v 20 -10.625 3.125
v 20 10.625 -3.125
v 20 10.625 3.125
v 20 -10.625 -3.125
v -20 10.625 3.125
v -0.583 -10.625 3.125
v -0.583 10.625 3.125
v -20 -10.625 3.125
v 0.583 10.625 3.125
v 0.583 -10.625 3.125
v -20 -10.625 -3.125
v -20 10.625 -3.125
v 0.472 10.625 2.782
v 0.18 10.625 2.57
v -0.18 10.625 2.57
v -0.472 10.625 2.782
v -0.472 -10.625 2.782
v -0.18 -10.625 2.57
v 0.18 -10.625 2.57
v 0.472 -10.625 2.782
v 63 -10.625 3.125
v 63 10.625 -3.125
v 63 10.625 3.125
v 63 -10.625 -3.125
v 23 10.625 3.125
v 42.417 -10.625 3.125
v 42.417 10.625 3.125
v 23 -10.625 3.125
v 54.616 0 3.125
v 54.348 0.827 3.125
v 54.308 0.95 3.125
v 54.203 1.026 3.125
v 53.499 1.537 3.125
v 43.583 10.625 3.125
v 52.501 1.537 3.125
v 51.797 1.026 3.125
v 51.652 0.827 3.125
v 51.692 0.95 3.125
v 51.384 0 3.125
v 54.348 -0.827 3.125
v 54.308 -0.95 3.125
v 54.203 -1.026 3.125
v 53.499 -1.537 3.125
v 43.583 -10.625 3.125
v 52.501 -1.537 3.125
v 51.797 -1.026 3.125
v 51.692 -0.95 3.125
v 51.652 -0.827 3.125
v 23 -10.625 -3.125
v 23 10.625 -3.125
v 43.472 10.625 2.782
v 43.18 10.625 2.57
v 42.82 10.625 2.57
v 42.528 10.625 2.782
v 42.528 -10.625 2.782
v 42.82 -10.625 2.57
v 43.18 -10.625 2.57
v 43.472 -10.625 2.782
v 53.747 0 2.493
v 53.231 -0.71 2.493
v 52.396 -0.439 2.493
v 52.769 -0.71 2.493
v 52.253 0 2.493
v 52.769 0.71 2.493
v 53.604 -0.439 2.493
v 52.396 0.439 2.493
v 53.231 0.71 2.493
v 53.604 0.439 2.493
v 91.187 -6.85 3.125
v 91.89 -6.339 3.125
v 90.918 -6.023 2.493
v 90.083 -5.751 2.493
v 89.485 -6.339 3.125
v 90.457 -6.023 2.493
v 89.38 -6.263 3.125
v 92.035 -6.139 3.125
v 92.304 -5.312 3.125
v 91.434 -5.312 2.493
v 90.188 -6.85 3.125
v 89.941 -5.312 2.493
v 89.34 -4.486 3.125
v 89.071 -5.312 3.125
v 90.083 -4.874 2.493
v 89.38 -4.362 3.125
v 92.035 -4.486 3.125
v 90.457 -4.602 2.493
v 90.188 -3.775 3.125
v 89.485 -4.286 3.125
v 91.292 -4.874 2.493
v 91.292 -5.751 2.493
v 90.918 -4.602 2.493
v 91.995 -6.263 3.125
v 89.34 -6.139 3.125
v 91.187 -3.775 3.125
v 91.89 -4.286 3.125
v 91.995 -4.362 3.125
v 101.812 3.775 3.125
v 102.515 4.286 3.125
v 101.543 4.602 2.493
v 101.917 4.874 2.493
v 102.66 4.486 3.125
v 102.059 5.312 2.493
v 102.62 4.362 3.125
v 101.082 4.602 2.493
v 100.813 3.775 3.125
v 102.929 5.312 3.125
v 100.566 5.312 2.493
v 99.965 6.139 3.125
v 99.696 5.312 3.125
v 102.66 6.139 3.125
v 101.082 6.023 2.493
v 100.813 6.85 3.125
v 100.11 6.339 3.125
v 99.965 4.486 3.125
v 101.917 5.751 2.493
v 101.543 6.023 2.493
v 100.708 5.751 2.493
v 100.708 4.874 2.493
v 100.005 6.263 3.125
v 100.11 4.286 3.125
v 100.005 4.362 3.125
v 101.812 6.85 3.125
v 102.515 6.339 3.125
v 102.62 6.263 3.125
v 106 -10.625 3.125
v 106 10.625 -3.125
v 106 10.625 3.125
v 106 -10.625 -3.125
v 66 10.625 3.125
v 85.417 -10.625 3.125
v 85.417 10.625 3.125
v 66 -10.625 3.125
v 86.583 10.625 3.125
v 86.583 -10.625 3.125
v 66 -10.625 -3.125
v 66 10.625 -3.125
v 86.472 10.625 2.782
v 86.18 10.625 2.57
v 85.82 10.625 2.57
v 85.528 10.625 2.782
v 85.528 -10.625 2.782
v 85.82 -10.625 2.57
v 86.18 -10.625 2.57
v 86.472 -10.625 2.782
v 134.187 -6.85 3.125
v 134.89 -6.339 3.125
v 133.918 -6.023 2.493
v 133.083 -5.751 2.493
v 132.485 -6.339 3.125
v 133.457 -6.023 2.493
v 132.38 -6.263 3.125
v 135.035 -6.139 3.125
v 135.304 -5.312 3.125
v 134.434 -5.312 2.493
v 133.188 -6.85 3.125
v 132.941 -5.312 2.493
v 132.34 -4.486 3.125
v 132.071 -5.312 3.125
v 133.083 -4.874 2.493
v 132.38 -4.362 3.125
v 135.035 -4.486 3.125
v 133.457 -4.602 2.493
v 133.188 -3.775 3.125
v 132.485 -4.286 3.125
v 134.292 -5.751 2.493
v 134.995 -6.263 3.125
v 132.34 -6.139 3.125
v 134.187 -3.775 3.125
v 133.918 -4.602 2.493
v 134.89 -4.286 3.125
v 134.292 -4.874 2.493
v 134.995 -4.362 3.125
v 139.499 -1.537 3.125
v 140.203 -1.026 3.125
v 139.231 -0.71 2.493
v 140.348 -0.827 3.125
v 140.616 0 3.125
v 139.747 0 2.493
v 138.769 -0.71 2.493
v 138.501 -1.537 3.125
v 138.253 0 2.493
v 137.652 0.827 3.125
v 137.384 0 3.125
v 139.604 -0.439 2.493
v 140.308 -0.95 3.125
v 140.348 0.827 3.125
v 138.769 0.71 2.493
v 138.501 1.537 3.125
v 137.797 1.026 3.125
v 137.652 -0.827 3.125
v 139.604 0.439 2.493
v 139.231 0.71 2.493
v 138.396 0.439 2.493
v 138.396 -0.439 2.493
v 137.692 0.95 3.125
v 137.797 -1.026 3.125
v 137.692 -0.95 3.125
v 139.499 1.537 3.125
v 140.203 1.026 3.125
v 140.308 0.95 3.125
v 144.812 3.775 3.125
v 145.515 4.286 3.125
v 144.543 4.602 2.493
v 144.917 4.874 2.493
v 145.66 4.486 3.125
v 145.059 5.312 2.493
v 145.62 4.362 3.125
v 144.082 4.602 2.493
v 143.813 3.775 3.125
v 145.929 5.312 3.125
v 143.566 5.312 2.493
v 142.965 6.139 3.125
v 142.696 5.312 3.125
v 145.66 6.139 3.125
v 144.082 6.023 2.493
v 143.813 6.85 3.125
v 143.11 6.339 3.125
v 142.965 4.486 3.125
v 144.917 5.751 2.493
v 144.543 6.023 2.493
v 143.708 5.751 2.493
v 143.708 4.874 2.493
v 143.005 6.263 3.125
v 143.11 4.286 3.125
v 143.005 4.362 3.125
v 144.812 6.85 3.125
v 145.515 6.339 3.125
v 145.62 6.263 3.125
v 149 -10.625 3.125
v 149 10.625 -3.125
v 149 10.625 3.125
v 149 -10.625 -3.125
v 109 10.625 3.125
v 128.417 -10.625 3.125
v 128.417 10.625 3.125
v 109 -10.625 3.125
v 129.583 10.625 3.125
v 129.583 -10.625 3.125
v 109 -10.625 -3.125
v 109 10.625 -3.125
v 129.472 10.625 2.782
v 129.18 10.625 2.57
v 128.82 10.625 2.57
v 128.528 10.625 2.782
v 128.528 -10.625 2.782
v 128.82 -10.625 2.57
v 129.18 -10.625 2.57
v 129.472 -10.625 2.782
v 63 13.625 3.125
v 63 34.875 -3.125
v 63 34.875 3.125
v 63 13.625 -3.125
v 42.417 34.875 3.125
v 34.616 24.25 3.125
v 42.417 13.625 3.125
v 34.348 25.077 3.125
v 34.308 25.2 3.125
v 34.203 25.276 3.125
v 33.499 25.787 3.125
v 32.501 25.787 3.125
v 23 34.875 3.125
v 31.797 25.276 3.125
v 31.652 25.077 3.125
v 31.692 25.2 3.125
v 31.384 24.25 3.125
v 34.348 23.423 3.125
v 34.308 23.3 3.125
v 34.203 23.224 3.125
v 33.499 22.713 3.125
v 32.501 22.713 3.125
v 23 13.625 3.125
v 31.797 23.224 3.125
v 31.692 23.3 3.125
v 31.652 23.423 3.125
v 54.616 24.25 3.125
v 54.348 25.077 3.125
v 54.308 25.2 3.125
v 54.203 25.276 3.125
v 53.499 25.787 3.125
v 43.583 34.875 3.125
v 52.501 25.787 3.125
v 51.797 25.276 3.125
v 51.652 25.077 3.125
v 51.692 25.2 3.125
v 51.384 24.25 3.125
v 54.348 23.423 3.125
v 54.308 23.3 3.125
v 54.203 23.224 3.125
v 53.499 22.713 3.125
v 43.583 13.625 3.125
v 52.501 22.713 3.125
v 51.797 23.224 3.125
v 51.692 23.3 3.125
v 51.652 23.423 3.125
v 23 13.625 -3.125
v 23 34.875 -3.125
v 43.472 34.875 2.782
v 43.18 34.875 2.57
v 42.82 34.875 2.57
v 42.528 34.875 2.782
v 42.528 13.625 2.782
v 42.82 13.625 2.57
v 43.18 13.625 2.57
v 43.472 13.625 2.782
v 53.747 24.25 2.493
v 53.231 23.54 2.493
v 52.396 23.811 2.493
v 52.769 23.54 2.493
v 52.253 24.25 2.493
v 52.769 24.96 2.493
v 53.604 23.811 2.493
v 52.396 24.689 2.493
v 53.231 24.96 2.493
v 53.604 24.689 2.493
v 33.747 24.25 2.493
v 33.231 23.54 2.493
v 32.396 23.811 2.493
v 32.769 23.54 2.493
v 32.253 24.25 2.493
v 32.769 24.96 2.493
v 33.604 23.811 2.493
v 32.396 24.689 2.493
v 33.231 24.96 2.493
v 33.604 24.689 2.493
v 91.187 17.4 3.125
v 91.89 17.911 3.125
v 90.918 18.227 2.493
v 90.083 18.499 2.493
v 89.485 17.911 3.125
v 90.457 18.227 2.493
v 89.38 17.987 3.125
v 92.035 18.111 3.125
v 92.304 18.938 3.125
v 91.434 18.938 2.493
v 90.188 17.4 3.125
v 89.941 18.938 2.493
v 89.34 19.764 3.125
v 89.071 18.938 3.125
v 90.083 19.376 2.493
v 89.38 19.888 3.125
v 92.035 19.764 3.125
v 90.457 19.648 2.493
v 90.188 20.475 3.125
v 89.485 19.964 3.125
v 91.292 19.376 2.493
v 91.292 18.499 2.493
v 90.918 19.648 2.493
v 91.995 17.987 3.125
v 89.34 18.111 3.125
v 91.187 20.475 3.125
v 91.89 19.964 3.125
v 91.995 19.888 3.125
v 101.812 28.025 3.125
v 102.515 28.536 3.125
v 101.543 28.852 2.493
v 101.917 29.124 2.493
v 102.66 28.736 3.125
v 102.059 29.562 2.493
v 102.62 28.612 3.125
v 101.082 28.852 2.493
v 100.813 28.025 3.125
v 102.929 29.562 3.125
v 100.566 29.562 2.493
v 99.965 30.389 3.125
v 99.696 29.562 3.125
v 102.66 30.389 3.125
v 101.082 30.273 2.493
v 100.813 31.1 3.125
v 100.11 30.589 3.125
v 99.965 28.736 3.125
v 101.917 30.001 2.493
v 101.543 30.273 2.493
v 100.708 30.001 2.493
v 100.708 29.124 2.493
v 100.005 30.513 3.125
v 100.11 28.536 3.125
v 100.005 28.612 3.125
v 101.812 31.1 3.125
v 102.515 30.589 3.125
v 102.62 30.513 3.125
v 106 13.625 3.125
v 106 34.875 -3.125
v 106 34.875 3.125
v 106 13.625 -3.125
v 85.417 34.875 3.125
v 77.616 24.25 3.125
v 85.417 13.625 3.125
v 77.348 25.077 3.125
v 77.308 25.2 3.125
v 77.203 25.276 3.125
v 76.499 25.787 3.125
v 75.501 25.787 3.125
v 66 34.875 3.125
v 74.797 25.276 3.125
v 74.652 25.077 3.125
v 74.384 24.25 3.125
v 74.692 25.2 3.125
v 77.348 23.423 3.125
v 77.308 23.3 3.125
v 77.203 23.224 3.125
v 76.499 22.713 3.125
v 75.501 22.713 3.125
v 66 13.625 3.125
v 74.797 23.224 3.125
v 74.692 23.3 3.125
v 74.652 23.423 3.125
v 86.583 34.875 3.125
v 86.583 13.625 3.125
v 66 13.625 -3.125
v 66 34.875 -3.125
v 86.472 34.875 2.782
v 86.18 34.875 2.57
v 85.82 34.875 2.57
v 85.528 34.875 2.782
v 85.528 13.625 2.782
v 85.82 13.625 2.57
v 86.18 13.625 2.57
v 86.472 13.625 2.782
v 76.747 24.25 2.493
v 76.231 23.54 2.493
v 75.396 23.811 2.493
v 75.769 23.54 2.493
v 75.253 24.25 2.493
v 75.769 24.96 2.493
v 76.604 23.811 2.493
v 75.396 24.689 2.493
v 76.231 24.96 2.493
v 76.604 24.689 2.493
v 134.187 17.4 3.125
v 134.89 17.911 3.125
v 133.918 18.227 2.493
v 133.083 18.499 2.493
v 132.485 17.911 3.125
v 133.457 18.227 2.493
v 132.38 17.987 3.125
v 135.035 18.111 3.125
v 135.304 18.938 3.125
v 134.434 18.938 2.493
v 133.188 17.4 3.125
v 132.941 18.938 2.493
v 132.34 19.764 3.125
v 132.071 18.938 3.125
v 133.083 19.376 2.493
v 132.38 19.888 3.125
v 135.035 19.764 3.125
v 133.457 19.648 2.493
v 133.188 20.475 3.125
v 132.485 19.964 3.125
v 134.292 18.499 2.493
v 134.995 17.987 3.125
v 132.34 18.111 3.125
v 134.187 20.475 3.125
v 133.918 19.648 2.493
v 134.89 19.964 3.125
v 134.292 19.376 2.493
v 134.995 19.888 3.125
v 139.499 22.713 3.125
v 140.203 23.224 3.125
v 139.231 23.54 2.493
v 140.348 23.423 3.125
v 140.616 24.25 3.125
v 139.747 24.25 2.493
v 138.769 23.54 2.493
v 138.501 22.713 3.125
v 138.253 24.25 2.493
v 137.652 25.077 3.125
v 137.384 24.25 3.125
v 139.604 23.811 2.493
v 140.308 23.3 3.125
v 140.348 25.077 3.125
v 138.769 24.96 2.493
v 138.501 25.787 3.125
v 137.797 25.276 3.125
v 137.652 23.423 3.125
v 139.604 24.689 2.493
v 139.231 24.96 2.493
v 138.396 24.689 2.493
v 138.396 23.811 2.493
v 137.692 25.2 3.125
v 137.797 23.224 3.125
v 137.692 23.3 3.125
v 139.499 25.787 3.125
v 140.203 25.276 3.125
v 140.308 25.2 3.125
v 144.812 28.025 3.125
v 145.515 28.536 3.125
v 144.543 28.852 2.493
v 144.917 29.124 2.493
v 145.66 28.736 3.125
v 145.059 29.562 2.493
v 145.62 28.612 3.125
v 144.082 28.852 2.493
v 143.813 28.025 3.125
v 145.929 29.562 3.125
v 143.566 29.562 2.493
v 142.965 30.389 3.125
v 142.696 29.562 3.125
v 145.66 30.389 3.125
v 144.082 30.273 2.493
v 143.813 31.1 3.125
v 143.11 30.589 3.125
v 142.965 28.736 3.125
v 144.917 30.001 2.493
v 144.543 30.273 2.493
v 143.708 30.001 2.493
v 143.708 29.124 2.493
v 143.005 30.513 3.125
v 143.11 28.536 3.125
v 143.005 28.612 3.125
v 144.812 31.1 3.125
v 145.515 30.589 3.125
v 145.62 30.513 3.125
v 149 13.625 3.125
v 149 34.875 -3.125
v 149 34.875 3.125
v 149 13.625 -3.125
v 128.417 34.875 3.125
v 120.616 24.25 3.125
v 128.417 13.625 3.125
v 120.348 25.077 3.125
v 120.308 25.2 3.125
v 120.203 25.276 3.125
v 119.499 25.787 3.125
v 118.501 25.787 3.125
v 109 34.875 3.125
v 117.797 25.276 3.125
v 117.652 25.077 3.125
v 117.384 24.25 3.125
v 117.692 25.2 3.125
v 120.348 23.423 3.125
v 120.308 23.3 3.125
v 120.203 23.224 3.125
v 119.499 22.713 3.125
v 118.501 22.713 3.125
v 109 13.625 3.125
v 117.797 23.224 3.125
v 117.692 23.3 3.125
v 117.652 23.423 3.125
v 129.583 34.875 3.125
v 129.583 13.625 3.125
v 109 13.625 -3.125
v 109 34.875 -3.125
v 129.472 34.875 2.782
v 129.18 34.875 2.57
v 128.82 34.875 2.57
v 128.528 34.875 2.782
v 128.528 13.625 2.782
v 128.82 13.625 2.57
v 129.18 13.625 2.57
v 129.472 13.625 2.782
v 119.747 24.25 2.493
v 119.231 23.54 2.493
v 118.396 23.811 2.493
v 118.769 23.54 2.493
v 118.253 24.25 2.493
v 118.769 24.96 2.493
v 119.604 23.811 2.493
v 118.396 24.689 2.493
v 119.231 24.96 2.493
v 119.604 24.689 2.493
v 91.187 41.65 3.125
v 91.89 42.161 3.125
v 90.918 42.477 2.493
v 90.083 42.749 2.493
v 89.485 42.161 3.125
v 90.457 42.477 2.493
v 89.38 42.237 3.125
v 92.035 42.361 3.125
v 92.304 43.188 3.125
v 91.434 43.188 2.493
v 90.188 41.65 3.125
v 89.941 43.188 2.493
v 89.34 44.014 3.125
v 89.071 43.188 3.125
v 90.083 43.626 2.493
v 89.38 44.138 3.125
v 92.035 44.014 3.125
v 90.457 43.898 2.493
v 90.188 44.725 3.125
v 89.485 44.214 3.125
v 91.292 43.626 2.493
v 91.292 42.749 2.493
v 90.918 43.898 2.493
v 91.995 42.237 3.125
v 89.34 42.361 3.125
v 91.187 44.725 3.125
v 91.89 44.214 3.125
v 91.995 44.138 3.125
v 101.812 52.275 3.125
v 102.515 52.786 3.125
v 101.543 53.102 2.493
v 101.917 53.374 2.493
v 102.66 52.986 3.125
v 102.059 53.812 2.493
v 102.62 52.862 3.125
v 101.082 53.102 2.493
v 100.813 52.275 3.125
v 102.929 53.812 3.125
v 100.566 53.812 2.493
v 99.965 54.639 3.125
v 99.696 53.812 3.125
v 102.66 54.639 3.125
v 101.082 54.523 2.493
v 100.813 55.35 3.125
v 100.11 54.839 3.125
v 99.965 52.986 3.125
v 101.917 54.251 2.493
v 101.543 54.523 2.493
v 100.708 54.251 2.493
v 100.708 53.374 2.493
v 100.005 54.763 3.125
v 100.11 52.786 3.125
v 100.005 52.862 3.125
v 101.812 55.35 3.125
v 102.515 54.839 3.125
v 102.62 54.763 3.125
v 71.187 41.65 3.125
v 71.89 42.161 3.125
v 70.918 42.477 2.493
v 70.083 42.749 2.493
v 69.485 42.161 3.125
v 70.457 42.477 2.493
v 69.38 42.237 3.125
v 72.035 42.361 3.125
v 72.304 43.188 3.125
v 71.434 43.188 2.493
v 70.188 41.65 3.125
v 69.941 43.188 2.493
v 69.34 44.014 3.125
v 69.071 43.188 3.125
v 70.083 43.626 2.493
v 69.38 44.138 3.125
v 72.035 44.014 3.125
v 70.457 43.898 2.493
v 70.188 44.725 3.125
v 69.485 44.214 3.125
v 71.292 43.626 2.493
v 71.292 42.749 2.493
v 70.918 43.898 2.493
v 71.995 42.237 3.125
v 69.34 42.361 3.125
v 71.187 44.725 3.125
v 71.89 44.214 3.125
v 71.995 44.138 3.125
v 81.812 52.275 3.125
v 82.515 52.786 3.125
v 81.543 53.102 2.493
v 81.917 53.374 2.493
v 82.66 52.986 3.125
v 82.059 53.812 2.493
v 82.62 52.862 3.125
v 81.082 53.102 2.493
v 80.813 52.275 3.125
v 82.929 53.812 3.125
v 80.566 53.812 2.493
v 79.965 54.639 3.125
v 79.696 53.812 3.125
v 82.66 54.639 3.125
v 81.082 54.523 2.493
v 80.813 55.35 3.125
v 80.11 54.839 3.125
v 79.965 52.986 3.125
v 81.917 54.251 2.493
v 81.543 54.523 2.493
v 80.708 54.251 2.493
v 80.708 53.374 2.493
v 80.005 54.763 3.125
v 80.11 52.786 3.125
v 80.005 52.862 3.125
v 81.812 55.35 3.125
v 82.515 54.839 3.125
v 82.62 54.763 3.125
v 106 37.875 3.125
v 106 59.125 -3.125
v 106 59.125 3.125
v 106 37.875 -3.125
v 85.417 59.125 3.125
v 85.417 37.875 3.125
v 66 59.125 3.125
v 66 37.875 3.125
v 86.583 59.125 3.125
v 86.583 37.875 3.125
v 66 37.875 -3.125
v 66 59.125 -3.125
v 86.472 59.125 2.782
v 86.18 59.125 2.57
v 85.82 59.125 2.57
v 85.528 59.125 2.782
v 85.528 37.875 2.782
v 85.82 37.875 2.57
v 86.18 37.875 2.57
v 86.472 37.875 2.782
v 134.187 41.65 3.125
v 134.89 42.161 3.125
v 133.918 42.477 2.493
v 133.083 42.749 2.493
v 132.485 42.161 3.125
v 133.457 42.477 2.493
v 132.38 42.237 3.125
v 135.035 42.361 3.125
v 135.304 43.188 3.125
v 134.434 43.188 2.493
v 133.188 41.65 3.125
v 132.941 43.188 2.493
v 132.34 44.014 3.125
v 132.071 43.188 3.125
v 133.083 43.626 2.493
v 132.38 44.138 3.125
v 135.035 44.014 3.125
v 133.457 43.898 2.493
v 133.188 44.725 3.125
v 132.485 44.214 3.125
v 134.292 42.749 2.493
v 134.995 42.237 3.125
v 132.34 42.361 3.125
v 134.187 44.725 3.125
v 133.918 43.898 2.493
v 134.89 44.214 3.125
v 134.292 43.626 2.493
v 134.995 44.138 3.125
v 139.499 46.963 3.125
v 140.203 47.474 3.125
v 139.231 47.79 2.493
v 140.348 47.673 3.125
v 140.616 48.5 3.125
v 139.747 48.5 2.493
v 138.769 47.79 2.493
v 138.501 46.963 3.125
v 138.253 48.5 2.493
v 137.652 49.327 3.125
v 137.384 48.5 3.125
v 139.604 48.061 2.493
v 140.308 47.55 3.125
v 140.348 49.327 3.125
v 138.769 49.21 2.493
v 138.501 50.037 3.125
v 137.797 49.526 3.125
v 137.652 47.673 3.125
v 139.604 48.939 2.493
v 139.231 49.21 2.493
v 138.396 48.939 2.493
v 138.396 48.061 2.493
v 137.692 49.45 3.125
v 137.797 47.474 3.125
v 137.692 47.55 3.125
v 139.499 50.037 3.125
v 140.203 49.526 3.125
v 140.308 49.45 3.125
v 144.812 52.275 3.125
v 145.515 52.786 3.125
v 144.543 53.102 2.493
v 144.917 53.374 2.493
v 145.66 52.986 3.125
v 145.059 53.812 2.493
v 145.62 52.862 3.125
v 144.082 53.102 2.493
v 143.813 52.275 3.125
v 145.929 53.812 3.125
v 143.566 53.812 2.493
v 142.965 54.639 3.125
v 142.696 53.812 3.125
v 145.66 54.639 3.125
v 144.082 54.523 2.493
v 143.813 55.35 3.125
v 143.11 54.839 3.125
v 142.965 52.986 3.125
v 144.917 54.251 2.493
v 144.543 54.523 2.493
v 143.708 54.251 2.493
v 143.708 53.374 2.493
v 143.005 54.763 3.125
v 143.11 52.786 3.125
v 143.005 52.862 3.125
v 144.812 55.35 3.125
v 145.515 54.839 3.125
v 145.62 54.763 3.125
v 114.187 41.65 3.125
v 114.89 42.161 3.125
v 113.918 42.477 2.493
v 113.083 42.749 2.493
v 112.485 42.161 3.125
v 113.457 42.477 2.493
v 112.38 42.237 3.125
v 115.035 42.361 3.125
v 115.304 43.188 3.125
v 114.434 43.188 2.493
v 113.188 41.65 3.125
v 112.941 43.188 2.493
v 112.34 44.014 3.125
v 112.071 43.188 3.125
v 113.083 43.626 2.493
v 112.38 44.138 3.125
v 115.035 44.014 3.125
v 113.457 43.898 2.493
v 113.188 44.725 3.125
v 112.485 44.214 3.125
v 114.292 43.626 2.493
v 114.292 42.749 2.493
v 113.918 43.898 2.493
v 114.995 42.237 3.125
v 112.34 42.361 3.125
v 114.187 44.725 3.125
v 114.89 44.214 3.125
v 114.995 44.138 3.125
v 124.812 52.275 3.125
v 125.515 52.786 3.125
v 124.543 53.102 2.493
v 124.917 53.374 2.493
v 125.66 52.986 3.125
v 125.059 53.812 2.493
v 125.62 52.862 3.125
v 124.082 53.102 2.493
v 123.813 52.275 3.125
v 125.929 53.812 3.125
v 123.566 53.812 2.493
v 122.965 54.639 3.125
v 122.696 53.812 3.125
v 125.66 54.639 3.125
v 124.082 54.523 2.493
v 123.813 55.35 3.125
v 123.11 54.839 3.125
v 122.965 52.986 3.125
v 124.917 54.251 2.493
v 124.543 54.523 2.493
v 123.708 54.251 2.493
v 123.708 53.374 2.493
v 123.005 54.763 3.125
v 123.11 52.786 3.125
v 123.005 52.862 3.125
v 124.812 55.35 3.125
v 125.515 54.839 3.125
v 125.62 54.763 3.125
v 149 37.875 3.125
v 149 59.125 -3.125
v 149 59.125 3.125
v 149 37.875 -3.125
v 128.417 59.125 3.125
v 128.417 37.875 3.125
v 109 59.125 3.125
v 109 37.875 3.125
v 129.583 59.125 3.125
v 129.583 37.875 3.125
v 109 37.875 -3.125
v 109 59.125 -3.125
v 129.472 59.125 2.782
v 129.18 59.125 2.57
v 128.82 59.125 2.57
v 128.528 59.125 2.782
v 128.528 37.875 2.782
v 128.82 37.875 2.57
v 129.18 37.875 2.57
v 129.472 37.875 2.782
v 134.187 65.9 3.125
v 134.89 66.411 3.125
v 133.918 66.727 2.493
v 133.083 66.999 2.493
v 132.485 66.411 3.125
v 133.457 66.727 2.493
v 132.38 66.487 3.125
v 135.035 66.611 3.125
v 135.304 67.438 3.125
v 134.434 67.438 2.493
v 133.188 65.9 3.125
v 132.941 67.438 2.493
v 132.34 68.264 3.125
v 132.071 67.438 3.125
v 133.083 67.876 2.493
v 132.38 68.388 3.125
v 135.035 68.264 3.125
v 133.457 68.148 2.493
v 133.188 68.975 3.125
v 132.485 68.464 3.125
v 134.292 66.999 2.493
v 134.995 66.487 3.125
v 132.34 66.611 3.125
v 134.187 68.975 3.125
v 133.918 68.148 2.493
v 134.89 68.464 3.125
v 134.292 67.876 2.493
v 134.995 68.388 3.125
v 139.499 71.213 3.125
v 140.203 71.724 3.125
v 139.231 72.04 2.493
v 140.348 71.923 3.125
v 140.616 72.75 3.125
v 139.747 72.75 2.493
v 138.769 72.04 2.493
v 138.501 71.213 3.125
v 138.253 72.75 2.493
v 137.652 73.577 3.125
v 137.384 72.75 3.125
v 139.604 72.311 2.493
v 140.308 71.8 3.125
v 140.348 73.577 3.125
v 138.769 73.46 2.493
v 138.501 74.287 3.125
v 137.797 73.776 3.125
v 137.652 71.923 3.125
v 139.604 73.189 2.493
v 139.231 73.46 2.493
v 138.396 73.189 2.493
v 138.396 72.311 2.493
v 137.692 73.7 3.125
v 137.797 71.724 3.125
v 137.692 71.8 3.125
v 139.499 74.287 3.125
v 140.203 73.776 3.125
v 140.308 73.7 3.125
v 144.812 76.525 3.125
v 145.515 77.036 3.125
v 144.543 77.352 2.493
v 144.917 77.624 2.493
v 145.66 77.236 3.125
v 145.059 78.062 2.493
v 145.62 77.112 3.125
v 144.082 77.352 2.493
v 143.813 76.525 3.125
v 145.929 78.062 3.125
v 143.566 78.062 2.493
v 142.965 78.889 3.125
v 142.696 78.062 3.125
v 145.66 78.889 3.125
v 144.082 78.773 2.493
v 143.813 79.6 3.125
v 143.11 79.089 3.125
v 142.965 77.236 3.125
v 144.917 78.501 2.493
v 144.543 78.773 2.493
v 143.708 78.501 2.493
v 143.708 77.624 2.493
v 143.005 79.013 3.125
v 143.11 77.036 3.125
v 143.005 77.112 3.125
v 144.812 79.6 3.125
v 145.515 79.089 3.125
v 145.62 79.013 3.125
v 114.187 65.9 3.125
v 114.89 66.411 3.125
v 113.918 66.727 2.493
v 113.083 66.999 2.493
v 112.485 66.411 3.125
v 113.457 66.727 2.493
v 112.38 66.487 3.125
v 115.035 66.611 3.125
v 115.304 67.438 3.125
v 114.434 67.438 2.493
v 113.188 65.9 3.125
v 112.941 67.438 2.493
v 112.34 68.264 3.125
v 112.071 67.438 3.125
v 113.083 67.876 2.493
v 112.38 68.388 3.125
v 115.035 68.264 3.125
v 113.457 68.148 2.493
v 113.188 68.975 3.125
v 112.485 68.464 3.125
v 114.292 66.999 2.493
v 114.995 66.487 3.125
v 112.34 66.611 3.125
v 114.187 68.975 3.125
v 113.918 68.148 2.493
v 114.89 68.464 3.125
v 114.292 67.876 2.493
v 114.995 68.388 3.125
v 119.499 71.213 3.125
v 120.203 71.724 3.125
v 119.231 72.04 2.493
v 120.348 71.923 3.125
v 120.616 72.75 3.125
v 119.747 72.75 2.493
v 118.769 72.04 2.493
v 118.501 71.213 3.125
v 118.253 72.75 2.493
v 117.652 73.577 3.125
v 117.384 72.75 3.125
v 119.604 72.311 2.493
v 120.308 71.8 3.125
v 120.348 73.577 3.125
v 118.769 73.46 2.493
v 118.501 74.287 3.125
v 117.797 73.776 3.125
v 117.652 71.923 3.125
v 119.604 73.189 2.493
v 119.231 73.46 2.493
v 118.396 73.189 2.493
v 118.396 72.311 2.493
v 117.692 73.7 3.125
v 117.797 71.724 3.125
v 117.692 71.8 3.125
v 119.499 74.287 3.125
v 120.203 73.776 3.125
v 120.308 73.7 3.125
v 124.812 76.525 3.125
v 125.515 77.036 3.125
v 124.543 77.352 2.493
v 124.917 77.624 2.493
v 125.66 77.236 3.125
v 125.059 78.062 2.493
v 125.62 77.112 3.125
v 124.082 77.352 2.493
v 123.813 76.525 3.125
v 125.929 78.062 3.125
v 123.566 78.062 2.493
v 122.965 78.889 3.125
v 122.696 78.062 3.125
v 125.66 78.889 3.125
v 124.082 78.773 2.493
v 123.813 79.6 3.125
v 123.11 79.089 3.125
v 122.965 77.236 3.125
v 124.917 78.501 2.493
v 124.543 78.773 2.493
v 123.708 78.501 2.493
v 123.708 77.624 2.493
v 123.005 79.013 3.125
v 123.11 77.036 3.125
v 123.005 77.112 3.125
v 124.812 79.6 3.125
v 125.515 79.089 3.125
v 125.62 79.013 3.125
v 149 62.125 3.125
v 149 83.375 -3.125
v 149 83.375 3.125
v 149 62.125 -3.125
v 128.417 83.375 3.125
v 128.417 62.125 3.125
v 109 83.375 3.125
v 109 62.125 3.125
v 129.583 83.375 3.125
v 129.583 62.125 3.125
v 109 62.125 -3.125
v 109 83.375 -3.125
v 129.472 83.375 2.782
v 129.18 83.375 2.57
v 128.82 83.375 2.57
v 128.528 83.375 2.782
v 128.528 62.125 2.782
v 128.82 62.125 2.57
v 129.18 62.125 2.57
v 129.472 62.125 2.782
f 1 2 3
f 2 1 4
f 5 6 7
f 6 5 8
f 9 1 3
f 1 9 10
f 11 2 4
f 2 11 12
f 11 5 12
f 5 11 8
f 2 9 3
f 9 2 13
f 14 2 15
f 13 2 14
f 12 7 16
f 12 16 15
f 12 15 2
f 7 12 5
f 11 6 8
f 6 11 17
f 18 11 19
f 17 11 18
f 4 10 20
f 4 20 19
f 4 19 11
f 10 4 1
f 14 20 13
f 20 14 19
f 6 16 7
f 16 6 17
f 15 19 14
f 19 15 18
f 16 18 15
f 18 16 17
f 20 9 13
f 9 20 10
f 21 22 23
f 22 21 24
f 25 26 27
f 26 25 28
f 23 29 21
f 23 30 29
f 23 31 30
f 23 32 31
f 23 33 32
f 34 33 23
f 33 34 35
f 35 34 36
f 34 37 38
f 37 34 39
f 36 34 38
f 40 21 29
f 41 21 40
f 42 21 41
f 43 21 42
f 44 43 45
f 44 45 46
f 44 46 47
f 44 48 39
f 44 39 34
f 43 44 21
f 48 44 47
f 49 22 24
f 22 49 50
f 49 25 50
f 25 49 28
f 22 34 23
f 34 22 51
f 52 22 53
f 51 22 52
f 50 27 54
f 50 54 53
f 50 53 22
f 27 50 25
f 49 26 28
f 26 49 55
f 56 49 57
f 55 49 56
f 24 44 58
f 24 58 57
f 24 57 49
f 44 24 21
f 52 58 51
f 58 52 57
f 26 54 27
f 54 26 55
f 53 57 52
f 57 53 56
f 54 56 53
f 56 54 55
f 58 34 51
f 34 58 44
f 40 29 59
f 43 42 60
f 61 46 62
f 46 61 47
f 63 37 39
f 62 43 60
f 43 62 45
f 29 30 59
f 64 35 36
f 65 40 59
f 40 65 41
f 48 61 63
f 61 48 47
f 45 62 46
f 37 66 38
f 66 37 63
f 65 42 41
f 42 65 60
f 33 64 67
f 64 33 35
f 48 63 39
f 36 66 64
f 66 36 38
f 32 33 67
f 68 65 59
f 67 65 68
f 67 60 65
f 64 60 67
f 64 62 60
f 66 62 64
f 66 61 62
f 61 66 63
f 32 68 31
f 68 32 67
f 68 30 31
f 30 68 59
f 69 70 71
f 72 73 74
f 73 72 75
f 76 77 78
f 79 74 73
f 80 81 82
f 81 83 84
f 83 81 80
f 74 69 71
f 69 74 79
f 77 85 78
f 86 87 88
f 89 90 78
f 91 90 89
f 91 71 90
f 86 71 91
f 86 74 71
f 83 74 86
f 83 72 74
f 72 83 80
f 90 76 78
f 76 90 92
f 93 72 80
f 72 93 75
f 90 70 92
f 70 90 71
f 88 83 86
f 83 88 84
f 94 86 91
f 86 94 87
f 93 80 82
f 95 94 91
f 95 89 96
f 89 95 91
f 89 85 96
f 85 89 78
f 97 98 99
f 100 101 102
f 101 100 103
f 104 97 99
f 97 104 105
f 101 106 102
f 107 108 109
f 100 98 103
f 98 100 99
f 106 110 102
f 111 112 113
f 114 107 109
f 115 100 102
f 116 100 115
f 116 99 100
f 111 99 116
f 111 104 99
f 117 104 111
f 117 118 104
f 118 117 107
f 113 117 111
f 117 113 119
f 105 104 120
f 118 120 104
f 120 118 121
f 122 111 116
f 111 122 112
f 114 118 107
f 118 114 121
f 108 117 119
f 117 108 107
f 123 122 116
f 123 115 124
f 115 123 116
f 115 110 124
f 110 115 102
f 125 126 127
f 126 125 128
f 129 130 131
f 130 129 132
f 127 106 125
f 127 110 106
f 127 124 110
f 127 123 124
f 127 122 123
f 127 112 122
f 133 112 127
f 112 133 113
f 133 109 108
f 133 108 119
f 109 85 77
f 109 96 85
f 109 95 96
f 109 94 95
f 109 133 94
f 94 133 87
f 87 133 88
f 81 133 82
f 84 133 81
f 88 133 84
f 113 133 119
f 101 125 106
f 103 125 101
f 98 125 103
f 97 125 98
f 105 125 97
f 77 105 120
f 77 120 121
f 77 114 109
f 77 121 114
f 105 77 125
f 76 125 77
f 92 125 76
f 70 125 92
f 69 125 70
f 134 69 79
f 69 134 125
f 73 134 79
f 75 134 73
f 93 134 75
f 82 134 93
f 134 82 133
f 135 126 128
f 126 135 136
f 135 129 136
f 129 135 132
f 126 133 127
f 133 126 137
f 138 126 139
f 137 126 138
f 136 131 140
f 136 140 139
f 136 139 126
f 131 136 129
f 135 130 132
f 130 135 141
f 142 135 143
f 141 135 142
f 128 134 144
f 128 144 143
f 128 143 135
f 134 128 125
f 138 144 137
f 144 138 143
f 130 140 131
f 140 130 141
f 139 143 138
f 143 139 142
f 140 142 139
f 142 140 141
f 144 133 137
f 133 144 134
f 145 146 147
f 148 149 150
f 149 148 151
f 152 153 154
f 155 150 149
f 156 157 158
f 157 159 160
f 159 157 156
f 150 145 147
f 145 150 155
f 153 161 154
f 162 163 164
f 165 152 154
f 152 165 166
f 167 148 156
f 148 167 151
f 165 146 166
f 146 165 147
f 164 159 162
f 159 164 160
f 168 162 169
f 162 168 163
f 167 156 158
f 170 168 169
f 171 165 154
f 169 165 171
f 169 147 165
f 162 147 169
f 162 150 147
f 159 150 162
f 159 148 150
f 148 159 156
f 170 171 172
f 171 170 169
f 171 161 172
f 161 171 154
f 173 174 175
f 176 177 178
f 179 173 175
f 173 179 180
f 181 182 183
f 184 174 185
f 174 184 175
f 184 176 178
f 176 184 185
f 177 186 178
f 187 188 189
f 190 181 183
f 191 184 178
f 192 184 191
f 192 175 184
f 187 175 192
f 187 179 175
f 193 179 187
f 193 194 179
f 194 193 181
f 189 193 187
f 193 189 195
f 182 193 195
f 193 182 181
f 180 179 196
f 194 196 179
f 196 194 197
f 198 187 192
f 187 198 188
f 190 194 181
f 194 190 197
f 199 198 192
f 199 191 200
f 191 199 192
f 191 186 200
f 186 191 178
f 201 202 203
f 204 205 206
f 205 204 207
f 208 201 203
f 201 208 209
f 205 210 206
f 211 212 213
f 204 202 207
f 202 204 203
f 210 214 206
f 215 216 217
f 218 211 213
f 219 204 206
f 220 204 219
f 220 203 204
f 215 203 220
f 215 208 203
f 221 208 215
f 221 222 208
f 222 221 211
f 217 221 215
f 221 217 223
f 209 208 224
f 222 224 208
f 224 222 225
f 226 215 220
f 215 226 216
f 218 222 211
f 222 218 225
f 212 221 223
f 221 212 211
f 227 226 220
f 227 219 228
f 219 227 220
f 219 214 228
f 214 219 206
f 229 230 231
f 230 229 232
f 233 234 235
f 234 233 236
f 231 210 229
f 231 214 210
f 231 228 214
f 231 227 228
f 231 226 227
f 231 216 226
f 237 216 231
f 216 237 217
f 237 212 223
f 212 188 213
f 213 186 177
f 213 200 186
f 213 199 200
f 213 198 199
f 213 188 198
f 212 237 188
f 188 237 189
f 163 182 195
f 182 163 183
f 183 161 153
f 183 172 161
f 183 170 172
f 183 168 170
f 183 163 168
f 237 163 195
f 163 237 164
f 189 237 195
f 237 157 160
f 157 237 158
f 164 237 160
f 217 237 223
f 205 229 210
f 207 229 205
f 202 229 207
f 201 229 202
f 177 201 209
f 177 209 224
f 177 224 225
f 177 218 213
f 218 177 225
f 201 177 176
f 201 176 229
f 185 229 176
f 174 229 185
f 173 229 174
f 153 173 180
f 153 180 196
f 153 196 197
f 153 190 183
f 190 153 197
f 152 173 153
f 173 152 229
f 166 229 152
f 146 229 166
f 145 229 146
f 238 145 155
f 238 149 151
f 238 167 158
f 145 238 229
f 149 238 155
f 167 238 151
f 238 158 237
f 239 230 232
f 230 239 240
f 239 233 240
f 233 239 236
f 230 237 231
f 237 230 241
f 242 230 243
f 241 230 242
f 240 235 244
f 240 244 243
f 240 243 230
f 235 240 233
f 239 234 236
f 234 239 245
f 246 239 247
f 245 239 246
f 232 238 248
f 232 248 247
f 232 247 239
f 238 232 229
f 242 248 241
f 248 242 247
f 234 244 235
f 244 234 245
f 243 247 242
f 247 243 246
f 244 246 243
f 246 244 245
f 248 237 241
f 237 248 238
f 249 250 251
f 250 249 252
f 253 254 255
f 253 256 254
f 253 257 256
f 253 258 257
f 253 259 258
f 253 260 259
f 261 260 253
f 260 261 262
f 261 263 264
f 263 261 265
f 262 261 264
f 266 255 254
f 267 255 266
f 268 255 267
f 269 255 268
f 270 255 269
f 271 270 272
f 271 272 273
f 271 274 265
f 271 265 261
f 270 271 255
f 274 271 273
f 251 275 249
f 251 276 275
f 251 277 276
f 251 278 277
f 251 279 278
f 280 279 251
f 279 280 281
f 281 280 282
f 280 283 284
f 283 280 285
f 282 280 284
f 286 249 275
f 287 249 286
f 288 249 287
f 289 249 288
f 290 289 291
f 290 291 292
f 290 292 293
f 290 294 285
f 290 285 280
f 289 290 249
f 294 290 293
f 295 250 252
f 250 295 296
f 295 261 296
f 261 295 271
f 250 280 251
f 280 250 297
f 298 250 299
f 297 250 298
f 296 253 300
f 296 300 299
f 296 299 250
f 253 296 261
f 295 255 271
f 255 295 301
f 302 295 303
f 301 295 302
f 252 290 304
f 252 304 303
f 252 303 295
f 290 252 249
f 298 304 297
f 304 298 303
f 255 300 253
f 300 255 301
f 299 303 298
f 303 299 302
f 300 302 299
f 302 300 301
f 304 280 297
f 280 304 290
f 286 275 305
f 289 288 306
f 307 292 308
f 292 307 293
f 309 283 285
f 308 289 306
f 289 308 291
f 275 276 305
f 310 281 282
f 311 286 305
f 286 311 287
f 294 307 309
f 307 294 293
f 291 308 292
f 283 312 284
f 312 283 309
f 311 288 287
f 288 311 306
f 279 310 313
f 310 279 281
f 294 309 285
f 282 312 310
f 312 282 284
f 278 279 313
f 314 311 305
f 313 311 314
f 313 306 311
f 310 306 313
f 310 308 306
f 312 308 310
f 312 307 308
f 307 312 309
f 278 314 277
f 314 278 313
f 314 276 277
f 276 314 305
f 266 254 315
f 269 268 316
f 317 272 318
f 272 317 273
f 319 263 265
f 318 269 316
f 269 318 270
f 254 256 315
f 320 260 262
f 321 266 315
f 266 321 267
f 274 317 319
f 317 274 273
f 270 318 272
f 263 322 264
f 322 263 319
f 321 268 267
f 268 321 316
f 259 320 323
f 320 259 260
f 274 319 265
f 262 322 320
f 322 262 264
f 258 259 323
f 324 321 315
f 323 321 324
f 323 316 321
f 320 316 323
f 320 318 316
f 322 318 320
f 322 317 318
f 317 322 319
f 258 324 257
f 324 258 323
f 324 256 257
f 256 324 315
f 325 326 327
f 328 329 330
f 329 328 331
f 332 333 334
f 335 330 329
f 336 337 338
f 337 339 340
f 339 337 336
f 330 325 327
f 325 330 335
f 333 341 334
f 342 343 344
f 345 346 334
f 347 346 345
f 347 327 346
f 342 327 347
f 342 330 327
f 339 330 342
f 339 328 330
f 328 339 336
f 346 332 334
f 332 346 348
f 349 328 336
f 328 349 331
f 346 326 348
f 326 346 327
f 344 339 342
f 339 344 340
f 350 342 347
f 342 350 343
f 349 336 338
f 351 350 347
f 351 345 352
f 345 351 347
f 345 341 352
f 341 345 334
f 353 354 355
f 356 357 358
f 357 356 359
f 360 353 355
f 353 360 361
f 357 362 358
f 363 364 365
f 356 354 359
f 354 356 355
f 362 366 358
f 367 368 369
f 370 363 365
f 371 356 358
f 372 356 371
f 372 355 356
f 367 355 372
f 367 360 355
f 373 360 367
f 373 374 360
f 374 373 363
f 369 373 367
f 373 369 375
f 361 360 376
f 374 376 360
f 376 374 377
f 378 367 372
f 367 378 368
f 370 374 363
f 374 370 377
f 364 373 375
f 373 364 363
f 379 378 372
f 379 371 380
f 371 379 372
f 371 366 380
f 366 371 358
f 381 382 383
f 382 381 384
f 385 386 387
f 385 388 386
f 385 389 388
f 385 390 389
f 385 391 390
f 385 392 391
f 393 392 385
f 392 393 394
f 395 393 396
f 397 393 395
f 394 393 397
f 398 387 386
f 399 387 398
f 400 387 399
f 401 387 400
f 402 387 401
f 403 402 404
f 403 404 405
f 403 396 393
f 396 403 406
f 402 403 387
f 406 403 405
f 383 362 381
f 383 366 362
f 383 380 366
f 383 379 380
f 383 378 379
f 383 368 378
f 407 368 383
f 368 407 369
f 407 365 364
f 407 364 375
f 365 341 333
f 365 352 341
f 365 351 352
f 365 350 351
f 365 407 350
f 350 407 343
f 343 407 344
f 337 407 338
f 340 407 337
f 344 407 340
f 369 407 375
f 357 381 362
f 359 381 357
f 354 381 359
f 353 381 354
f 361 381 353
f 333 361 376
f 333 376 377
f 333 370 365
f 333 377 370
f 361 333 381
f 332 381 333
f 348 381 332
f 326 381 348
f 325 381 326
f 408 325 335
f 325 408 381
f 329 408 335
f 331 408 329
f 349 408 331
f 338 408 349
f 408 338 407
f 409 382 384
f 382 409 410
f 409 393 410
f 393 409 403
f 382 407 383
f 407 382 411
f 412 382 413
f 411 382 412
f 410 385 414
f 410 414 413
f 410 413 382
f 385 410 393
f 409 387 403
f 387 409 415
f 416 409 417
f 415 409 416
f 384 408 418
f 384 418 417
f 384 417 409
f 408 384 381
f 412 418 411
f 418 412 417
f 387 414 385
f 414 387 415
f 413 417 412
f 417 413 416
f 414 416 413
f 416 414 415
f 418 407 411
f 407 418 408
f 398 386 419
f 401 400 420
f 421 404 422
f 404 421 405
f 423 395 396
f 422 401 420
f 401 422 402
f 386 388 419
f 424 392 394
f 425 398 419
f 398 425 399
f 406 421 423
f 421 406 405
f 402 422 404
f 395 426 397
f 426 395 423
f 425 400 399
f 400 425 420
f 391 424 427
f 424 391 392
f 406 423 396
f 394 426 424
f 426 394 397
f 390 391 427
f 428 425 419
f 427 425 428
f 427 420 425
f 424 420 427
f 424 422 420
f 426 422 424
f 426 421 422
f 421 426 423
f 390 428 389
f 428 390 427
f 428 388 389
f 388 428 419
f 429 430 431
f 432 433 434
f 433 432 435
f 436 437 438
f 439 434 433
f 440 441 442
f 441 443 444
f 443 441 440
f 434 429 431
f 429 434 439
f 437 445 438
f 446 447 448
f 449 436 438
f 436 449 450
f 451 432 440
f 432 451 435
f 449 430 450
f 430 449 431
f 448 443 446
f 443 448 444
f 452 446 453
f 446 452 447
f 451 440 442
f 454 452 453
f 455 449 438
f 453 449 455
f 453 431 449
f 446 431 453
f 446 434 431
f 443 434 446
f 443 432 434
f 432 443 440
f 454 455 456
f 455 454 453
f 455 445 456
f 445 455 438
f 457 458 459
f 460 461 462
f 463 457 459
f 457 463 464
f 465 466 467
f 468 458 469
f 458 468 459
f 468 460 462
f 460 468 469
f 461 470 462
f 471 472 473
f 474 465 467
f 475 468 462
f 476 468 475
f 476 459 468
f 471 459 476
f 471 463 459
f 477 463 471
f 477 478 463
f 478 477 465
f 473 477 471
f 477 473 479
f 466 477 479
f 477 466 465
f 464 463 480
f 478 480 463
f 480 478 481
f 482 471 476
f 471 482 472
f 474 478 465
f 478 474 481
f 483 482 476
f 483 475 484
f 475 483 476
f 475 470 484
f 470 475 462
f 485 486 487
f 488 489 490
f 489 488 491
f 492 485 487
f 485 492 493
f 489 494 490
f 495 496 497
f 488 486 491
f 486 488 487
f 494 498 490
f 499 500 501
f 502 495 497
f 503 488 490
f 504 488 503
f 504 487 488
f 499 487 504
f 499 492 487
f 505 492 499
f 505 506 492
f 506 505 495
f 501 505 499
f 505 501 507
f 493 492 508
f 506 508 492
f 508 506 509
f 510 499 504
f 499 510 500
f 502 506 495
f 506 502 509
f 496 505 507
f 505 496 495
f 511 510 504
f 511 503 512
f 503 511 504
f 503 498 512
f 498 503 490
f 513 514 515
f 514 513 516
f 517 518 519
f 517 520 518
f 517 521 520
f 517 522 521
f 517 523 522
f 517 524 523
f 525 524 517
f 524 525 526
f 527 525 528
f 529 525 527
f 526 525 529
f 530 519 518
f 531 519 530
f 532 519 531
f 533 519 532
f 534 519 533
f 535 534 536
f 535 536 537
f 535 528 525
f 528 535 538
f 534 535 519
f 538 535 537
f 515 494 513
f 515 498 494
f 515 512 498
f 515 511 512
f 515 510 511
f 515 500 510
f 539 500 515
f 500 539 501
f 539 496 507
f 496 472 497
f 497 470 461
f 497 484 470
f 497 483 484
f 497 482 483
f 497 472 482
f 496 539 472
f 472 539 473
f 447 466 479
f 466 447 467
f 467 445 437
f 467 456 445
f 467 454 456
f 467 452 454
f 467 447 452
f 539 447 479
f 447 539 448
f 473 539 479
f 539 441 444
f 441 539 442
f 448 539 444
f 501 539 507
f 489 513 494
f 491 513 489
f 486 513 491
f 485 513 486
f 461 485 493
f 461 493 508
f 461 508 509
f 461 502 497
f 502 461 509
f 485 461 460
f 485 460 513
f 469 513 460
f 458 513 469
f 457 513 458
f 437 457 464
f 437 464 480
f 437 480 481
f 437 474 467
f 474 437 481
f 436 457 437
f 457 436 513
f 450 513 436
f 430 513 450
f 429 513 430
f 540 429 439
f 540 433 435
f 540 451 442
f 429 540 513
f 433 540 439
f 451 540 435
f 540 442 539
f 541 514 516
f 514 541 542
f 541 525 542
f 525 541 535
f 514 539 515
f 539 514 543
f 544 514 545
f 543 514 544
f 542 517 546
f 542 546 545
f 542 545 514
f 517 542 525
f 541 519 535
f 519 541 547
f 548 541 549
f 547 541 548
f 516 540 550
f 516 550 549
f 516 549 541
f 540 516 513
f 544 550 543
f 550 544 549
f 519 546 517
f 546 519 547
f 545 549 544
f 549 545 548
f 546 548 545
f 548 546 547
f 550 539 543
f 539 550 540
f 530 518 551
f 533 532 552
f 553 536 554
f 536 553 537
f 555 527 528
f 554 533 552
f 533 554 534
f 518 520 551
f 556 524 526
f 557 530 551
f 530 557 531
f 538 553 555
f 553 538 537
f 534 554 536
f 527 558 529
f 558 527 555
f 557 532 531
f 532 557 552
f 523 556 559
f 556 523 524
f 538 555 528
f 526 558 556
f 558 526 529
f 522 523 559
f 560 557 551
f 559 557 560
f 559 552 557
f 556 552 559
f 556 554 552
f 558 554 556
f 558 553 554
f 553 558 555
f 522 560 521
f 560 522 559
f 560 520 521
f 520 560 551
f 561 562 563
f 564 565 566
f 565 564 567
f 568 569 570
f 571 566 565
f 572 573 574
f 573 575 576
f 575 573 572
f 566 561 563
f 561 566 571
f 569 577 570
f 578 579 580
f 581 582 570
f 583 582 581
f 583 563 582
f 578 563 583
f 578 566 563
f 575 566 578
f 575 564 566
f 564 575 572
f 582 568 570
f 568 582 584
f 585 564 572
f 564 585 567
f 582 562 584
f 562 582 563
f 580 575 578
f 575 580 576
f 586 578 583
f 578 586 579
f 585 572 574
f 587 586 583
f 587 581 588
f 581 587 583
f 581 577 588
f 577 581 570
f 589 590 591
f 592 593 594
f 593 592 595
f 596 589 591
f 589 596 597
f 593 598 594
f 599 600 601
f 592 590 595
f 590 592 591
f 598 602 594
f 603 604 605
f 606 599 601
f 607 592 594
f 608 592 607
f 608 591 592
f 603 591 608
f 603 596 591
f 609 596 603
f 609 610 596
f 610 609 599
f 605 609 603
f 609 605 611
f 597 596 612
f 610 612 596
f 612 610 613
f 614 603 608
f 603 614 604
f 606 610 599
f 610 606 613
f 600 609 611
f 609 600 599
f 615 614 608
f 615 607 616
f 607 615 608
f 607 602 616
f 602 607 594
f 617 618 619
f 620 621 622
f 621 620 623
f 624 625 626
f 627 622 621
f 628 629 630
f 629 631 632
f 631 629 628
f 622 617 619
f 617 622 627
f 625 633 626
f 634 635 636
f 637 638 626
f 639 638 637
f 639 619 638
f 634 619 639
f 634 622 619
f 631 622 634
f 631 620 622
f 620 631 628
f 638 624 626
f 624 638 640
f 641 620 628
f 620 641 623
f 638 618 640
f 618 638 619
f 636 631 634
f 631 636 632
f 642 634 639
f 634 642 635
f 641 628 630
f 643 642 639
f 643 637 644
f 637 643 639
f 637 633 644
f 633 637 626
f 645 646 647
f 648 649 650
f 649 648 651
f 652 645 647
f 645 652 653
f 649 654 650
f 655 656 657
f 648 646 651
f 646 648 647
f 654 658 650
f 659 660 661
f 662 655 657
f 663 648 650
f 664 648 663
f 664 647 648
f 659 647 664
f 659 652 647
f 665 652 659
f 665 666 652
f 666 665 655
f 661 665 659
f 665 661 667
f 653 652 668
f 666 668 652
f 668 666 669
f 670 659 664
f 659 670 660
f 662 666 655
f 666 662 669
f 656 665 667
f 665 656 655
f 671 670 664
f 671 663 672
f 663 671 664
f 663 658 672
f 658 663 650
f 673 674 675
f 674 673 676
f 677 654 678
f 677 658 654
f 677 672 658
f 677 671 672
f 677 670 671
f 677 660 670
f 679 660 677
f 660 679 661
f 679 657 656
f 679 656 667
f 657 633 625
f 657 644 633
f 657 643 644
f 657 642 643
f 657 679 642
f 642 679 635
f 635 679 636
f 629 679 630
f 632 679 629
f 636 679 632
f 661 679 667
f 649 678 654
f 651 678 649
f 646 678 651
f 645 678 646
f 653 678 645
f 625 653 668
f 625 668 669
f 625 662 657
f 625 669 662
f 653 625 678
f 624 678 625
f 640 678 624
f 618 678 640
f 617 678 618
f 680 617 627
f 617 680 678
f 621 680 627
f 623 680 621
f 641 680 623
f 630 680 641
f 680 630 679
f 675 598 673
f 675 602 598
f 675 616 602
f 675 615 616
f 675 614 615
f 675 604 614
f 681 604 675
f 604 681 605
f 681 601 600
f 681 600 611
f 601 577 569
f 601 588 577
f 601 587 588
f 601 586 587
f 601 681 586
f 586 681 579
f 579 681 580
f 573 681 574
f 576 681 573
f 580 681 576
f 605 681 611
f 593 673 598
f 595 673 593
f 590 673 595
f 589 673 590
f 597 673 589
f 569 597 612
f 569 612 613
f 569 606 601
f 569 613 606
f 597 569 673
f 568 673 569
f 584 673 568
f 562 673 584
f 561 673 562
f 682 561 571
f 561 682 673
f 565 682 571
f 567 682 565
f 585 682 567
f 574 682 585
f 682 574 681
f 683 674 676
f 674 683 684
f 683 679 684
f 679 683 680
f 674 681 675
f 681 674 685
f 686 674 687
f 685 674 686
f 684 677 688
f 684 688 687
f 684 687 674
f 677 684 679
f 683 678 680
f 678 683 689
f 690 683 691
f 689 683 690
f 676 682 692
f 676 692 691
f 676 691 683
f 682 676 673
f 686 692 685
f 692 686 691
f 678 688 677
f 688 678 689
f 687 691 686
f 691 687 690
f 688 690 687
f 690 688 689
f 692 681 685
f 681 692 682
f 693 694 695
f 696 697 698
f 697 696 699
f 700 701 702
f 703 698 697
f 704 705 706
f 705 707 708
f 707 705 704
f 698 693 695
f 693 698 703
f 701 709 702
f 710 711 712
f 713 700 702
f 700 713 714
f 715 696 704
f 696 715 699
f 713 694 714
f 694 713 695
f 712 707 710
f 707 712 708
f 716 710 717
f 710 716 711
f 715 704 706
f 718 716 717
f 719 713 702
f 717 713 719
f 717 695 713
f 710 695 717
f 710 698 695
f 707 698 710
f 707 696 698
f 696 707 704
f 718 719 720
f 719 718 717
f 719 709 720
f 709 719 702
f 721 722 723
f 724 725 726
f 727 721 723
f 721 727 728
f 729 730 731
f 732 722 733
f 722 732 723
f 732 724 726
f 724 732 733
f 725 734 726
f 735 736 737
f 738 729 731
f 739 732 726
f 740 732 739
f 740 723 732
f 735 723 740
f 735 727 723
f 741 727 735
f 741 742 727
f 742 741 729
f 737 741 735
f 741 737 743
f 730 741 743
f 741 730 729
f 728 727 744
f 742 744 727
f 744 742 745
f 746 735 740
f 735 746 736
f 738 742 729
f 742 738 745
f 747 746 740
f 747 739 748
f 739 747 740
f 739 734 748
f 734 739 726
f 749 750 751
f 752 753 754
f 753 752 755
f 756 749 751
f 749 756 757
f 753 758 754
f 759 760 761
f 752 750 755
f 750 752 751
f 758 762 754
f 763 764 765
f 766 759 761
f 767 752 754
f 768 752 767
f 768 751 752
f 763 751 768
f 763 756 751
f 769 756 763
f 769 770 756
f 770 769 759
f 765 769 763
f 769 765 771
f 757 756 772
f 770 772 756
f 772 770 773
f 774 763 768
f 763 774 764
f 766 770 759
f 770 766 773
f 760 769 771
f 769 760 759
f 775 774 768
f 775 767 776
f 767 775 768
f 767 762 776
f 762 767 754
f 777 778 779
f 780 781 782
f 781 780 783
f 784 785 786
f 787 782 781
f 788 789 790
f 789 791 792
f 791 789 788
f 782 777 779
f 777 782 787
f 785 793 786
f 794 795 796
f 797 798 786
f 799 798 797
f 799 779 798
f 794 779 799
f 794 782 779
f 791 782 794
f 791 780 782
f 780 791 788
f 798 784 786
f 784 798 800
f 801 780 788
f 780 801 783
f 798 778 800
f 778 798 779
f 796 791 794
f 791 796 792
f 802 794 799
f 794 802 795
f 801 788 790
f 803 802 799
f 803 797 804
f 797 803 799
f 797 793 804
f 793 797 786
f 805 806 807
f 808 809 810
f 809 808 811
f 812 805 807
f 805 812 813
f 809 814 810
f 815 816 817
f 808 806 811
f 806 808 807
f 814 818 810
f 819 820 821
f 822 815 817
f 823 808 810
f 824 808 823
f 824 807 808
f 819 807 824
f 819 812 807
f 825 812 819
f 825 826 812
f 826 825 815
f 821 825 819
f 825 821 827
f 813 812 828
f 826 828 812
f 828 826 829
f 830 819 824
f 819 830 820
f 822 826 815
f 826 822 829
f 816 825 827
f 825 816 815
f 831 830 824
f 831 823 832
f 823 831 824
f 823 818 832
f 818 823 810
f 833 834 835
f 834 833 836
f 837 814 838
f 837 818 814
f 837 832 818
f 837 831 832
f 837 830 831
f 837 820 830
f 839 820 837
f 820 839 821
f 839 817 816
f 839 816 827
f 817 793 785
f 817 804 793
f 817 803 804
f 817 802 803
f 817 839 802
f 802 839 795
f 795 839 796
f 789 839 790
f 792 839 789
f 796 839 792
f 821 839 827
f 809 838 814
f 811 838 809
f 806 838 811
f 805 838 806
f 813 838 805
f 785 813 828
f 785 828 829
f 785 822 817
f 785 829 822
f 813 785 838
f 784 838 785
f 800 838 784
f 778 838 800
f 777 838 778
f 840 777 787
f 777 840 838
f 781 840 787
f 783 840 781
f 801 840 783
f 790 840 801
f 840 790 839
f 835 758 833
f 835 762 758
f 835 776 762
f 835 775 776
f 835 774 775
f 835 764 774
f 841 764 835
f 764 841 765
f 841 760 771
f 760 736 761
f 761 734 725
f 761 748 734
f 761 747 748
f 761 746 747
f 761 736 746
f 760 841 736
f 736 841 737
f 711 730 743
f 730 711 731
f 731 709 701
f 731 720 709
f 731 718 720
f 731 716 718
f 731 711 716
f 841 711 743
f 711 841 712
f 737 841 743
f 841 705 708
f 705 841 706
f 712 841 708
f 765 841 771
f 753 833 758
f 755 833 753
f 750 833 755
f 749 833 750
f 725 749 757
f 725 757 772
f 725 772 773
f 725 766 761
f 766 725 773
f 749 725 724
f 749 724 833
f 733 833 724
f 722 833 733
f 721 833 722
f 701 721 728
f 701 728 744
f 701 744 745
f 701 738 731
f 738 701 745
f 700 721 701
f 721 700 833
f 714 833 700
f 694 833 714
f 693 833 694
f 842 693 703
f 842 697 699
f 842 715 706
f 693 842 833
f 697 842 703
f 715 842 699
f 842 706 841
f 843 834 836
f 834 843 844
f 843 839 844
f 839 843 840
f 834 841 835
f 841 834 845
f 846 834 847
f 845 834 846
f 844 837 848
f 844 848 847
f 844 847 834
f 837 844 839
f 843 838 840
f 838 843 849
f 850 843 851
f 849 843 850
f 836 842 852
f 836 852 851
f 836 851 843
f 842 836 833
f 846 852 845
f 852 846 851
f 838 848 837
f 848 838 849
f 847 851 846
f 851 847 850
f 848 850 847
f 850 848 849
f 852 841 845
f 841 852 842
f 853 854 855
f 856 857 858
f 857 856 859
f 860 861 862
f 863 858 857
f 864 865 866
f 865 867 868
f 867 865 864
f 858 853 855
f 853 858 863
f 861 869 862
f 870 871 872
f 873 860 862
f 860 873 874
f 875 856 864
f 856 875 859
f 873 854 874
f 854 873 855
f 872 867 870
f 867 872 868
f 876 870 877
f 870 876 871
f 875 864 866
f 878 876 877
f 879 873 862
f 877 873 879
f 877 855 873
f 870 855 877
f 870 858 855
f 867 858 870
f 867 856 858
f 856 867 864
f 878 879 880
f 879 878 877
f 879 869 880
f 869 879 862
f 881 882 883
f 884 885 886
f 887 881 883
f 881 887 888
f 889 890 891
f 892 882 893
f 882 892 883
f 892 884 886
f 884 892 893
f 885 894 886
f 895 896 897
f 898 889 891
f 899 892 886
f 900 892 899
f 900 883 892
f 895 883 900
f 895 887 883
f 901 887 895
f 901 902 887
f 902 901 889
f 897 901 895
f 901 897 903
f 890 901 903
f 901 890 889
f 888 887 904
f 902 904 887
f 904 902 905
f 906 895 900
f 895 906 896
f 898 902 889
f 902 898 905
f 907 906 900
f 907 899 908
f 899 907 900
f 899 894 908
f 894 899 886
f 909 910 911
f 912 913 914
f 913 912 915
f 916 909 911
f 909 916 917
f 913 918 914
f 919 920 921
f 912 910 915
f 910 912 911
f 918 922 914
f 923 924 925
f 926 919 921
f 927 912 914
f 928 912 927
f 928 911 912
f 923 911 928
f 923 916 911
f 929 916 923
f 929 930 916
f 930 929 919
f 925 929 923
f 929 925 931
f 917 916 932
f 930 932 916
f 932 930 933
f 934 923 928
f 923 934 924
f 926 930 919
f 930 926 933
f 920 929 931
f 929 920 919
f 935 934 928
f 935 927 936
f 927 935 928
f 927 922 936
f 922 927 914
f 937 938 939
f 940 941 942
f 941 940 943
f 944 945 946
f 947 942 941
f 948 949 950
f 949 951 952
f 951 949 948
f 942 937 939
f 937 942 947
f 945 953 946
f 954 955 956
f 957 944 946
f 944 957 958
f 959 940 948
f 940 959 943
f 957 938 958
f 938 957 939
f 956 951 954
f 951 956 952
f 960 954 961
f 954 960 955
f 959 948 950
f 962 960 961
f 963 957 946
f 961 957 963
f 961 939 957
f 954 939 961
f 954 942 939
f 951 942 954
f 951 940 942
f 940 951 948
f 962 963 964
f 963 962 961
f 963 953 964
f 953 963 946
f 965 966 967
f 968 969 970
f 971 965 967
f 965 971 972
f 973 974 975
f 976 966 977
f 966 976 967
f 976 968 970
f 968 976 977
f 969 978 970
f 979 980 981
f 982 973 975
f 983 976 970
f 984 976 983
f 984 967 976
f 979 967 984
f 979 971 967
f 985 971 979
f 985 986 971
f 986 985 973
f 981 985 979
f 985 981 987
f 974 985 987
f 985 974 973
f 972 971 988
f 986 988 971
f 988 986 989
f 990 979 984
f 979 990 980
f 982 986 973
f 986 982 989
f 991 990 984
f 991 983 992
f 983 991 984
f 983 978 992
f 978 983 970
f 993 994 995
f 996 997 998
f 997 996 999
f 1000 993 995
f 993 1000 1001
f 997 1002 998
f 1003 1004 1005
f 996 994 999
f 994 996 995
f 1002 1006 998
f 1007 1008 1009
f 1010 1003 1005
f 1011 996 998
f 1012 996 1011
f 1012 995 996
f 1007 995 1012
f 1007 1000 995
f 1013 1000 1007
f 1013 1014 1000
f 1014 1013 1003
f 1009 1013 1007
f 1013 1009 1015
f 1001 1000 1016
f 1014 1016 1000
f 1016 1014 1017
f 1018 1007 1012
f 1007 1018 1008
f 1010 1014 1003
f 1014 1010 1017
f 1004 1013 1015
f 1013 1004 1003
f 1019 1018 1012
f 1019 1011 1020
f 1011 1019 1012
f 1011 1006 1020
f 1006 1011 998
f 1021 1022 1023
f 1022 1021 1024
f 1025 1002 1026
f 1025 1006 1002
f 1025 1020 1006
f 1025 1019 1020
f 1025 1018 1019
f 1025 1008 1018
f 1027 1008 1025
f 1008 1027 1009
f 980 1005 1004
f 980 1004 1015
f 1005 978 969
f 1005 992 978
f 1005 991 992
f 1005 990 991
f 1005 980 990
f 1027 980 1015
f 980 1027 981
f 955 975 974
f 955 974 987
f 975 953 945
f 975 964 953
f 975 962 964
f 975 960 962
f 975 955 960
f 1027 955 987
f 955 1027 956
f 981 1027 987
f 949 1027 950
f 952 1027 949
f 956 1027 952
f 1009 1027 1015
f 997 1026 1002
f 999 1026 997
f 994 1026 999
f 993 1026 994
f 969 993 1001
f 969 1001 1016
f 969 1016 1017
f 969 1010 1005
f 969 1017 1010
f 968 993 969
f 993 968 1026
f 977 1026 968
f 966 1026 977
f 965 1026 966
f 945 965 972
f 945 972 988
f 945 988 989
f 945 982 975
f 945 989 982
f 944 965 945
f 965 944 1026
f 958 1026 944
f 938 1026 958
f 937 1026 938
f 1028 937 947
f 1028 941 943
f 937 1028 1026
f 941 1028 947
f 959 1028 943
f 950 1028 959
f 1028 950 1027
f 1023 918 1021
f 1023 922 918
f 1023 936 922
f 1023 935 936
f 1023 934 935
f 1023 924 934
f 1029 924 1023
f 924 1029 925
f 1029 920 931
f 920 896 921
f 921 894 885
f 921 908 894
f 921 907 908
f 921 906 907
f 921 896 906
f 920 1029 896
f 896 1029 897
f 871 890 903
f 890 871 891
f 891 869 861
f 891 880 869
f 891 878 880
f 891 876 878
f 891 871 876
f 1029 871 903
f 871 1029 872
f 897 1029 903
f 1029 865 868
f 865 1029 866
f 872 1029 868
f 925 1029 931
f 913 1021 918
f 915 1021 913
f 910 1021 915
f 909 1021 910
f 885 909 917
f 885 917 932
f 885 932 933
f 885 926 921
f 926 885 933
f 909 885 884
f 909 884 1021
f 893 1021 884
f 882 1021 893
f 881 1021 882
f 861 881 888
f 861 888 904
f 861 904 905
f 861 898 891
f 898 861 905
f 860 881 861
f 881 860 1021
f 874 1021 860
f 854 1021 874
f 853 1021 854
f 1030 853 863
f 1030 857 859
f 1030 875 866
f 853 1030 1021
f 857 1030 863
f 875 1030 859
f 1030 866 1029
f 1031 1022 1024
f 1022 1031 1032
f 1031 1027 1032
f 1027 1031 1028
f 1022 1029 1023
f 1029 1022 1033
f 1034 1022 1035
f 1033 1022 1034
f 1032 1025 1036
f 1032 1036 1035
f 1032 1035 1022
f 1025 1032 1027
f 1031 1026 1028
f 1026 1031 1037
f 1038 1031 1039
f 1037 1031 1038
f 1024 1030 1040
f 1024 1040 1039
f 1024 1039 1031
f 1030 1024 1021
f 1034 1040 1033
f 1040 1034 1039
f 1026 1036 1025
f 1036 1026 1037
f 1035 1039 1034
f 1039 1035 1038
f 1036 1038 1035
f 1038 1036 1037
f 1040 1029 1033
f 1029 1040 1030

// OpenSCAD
// Domino

fn = 10;
length = 40;
width = 21.25;
depth = 6.25;
pip_radius = 1.75;
pip_depth = 0.75;

spacing = 3;

pip_pat = [ [[]],  //     #0 has no pips
            [[[0,0]]], // #1
            [[[-1,-1],[1,1]]], // #2
            [[[-1,-1],[0,0],[1,1]]],  // #3
            [[[-1,-1],[-1,1],[1,-1],[1,1]]], // #4
            [[[-1,-1],[-1,1],[1,-1],[1,1],[0,0]]], // #5
            [[[-1,-1],[-1,0],[-1,1],[1,-1],[1,0],[1,1]]]  // #6
];
        
module pip(r, d) {
    sphere_radius = (pow(r,2) + pow(d,2)) / (2*d);
    translate([0,0,sphere_radius-d]) sphere(sphere_radius, $fn=fn);
}

module pips(num, size, r, d) {
    union () {
        for(all_pips = pip_pat[num]) {
            for(this_pip = all_pips) {
                translate(size*[this_pip[0],this_pip[1],0]) pip(r,d);
            }
        }
    }
}

module domino(num_A, num_B, length, width, depth) {
    difference () {
        cube([length,width,depth], r=0.5, center=true);
        translate([0,0,depth/2]) 
            rotate([90,0,0]) 
                cylinder(h=1.1*width, r=pip_radius/3, center=true, $fn=fn);
        translate([length/4,0,depth/2])  pips(num_A,width/4, pip_radius, pip_depth);
        translate([-length/4,0,depth/2])  pips(num_B,width/4, pip_radius, pip_depth);
    }
}

module dominoes(length, width, depth, spacing, maxpips) {
    union () {
        for(row = [0:maxpips]) {
            for(col = [row:maxpips]) {
                translate([col*(length+spacing),row*(width+spacing),0]) domino(col, row, length, width, depth);
            }
        }
    }
}

dominoes(length,width,depth,spacing, 3);
